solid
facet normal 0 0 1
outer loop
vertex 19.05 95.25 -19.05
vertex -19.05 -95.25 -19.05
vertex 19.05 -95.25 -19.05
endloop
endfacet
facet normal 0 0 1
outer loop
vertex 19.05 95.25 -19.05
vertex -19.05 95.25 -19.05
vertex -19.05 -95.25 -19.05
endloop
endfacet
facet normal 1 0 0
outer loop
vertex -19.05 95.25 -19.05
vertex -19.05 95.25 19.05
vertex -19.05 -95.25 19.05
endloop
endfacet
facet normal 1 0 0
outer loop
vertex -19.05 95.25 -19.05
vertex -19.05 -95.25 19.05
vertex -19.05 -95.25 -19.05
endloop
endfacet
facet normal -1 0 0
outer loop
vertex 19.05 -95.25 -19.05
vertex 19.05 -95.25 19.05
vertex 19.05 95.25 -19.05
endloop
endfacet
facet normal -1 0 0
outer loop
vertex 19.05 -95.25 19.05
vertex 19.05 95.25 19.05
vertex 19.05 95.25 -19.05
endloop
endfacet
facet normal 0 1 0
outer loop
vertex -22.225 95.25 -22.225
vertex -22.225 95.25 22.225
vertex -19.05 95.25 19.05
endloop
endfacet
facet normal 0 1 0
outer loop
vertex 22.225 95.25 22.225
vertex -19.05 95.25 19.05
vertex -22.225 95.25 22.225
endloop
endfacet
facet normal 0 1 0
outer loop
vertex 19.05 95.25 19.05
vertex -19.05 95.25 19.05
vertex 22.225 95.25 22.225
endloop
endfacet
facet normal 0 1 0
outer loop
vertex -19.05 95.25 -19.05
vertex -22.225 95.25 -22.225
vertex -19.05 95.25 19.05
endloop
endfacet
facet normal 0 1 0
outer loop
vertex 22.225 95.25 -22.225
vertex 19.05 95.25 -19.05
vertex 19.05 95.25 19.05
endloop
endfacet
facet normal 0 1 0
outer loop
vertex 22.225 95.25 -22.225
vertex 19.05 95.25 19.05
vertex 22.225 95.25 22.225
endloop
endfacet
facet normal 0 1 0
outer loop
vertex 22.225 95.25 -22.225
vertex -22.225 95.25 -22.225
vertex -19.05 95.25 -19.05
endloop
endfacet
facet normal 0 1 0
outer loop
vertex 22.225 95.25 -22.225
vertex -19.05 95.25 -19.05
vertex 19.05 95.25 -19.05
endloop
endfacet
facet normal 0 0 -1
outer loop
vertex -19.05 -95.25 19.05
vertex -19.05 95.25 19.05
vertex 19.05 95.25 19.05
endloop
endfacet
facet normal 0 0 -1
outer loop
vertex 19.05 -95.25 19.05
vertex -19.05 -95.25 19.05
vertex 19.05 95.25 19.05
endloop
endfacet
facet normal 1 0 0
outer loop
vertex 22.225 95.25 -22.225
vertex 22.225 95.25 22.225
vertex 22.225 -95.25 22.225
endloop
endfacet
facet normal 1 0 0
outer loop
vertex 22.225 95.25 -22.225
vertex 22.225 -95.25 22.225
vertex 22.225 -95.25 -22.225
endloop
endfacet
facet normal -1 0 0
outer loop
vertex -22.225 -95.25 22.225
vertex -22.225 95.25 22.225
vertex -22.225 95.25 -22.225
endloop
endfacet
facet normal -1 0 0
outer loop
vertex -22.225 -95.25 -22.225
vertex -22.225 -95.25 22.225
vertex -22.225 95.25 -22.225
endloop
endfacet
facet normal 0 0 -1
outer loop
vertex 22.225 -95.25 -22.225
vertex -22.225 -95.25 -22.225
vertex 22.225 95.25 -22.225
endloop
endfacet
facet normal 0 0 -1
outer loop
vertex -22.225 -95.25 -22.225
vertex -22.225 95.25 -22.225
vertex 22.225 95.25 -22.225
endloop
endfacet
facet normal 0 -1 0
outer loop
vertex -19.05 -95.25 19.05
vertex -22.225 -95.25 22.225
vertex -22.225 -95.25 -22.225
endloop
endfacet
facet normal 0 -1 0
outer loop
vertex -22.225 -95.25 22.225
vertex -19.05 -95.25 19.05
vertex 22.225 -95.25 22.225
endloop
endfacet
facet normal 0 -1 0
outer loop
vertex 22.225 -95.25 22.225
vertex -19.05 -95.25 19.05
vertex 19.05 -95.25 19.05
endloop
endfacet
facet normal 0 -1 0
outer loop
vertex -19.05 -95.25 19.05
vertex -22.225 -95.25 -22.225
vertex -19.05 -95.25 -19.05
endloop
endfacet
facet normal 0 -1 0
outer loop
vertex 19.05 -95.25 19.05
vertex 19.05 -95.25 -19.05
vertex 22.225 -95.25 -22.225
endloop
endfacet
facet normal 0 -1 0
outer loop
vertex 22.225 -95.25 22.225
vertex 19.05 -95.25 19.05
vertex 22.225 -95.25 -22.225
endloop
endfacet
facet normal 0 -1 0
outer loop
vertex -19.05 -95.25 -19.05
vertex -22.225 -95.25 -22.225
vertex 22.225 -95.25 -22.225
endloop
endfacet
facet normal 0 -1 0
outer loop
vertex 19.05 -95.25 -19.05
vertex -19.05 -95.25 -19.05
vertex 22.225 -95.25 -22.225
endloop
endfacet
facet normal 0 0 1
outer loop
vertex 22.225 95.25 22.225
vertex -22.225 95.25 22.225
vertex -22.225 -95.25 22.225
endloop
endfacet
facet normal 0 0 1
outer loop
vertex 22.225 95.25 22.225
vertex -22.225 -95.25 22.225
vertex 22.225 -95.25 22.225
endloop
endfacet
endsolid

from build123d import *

# Parameters (mm, degrees)
BOSS_EXTRUDE1_DEPTH      = 95.25
BOSS_EXTRUDE1_DEPTH_BACK = 95.25
SKETCH1_W                = 44.45
SKETCH1_H                = 44.45
SKETCH1_W_2              = 38.1
SKETCH1_H_2              = 38.1


with BuildPart() as part:
    # Sketch1 → Boss-Extrude1 (new, two sides: drawn at the far end of the back side and taken through both)
    with BuildSketch(Plane(origin=(0, 0, 0), x_dir=(1, 0, 0), z_dir=(0, 1, 0)).offset(-BOSS_EXTRUDE1_DEPTH_BACK)):
        Rectangle(SKETCH1_W, SKETCH1_H)
        Rectangle(SKETCH1_W_2, SKETCH1_H_2, mode=Mode.SUBTRACT)
    extrude(amount=BOSS_EXTRUDE1_DEPTH + BOSS_EXTRUDE1_DEPTH_BACK)


solid = part.part
